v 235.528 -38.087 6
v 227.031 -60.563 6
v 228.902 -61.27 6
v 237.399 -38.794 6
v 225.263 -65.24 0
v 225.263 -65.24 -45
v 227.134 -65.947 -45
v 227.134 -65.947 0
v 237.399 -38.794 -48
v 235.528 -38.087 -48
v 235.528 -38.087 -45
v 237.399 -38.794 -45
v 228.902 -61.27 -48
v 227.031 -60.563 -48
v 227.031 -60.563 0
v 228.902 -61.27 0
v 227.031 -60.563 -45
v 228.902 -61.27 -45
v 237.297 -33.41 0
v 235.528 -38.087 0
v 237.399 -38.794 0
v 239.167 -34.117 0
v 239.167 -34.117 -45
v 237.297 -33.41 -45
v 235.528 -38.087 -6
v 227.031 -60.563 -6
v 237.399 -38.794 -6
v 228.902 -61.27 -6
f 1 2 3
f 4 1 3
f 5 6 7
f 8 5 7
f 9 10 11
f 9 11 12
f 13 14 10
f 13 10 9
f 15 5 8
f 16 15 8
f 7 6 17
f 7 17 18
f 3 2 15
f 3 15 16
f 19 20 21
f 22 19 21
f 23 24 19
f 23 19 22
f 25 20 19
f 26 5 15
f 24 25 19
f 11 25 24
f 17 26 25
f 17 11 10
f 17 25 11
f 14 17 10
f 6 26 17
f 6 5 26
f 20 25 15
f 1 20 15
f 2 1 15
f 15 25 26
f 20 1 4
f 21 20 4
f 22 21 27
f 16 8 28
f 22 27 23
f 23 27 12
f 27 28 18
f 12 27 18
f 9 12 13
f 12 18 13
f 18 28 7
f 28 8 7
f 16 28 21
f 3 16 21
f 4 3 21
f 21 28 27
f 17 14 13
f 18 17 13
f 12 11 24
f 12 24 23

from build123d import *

# Parameters (mm, degrees)
ESTRUSIONE_ESTRUSIONE1_DEPTH      = 48
ESTRUSIONE_ESTRUSIONE1_DEPTH_BACK = 6
SCHIZZO2_W                        = 2
SCHIZZO2_H                        = 45
ESTRUSIONE_ESTRUSIONE2_DEPTH      = 5
CORPO_SPOSTA_COPIA1_START         = 18.633322101
CORPO_SPOSTA_COPIA1_OUTLINE_W     = 2
CORPO_SPOSTA_COPIA1_OUTLINE_H     = 42
CORPO_SPOSTA_COPIA1_DEPTH         = 34.028742836
CORPO_SPOSTA_COPIA1_2_OUTLINE_W   = 2
CORPO_SPOSTA_COPIA1_2_OUTLINE_H   = 6
CORPO_SPOSTA_COPIA1_2_DEPTH       = 5
CORPO_SPOSTA_COPIA1_START_2       = 47.662064937
CORPO_SPOSTA_COPIA1_3_OUTLINE_W   = 2
CORPO_SPOSTA_COPIA1_3_OUTLINE_H   = 6
CORPO_SPOSTA_COPIA1_3_DEPTH       = 5
CORPO_SPOSTA_COPIA1_4_OUTLINE_W   = 2
CORPO_SPOSTA_COPIA1_4_OUTLINE_H   = 45
CORPO_SPOSTA_COPIA1_4_DEPTH       = 34.028742836
CORPO_SPOSTA_COPIA1_START_3       = 23.633322101
CORPO_SPOSTA_COPIA1_5_OUTLINE_W   = 2
CORPO_SPOSTA_COPIA1_5_OUTLINE_H   = 3
CORPO_SPOSTA_COPIA1_5_DEPTH       = 24.028742836


# Read off the part's stored shape, not the designer's step: Corpo-Sposta/copia1
with BuildPart() as part:
    # Schizzo1 → Estrusione-Estrusione1 (new, two sides: drawn at the far end of the back side and taken through both)
    with BuildSketch(Plane.XY.offset(-ESTRUSIONE_ESTRUSIONE1_DEPTH_BACK)):
        Polygon((235.52839554, -38.086696659), (227.03131331, -60.562907992), (228.902090444, -61.27015117), (237.399172674, -38.793939838), align=None)
    extrude(amount=ESTRUSIONE_ESTRUSIONE1_DEPTH + ESTRUSIONE_ESTRUSIONE1_DEPTH_BACK)

    # Schizzo2 → Estrusione-Estrusione2 (add)
    with BuildSketch(Plane(origin=(16.854335152, 44.58255063, 0), x_dir=(0.9353885671687735, -0.3536215892871206, 0), z_dir=(0.3536215892871206, 0.9353885671687735, 0))):
        with Locations((234.778846635, -22.5)):
            Rectangle(SCHIZZO2_W, SCHIZZO2_H)
    estrusione_estrusione2 = extrude(amount=ESTRUSIONE_ESTRUSIONE2_DEPTH)

    # Specchia1: Estrusione-Estrusione2 across plane
    add(estrusione_estrusione2.mirror(Plane(origin=(12.605794037, 33.344444963, 0), x_dir=(0, 0, 1), z_dir=(0.35362158928712106, 0.9353885671687733, 0))))

    # Corpo-Sposta/copia1 outline → Corpo-Sposta/copia1 (cut)
    with BuildSketch(Plane(origin=(0, 0, 0), x_dir=(0.9353885671687733, -0.3536215892871211, 0), z_dir=(0.35362158928712106, 0.9353885671687733, 0)).offset(CORPO_SPOSTA_COPIA1_START)):
        with Locations((234.778846635, -27)):
            Rectangle(CORPO_SPOSTA_COPIA1_OUTLINE_W, CORPO_SPOSTA_COPIA1_OUTLINE_H)
    extrude(amount=CORPO_SPOSTA_COPIA1_DEPTH, mode=Mode.SUBTRACT)

    # Corpo-Sposta_copia1 2 outline → Corpo-Sposta_copia1 2 (cut)
    with BuildSketch(Plane(origin=(0, 0, 0), x_dir=(0.9353885671687733, -0.3536215892871211, 0), z_dir=(0.35362158928712106, 0.9353885671687733, 0)).offset(CORPO_SPOSTA_COPIA1_START)):
        with Locations((234.778846635, -3)):
            Rectangle(CORPO_SPOSTA_COPIA1_2_OUTLINE_W, CORPO_SPOSTA_COPIA1_2_OUTLINE_H)
    extrude(amount=CORPO_SPOSTA_COPIA1_2_DEPTH, mode=Mode.SUBTRACT)

    # Corpo-Sposta_copia1 3 outline → Corpo-Sposta_copia1 3 (cut)
    with BuildSketch(Plane(origin=(0, 0, 0), x_dir=(0.9353885671687733, -0.3536215892871211, 0), z_dir=(0.35362158928712106, 0.9353885671687733, 0)).offset(CORPO_SPOSTA_COPIA1_START_2)):
        with Locations((234.778846635, -3)):
            Rectangle(CORPO_SPOSTA_COPIA1_3_OUTLINE_W, CORPO_SPOSTA_COPIA1_3_OUTLINE_H)
    extrude(amount=CORPO_SPOSTA_COPIA1_3_DEPTH, mode=Mode.SUBTRACT)

    # Corpo-Sposta_copia1 4 outline → Corpo-Sposta_copia1 4 (add)
    with BuildSketch(Plane(origin=(0, 0, 0), x_dir=(0.9353885671687733, -0.3536215892871211, 0), z_dir=(0.35362158928712106, 0.9353885671687733, 0)).offset(CORPO_SPOSTA_COPIA1_START)):
        with Locations((234.778846635, 22.5)):
            Rectangle(CORPO_SPOSTA_COPIA1_4_OUTLINE_W, CORPO_SPOSTA_COPIA1_4_OUTLINE_H)
    extrude(amount=CORPO_SPOSTA_COPIA1_4_DEPTH)

    # Corpo-Sposta_copia1 5 outline → Corpo-Sposta_copia1 5 (add)
    with BuildSketch(Plane(origin=(0, 0, 0), x_dir=(0.9353885671687733, -0.3536215892871211, 0), z_dir=(0.35362158928712106, 0.9353885671687733, 0)).offset(CORPO_SPOSTA_COPIA1_START_3)):
        with Locations((234.778846635, 46.5)):
            Rectangle(CORPO_SPOSTA_COPIA1_5_OUTLINE_W, CORPO_SPOSTA_COPIA1_5_OUTLINE_H)
    extrude(amount=CORPO_SPOSTA_COPIA1_5_DEPTH)


solid = part.part
